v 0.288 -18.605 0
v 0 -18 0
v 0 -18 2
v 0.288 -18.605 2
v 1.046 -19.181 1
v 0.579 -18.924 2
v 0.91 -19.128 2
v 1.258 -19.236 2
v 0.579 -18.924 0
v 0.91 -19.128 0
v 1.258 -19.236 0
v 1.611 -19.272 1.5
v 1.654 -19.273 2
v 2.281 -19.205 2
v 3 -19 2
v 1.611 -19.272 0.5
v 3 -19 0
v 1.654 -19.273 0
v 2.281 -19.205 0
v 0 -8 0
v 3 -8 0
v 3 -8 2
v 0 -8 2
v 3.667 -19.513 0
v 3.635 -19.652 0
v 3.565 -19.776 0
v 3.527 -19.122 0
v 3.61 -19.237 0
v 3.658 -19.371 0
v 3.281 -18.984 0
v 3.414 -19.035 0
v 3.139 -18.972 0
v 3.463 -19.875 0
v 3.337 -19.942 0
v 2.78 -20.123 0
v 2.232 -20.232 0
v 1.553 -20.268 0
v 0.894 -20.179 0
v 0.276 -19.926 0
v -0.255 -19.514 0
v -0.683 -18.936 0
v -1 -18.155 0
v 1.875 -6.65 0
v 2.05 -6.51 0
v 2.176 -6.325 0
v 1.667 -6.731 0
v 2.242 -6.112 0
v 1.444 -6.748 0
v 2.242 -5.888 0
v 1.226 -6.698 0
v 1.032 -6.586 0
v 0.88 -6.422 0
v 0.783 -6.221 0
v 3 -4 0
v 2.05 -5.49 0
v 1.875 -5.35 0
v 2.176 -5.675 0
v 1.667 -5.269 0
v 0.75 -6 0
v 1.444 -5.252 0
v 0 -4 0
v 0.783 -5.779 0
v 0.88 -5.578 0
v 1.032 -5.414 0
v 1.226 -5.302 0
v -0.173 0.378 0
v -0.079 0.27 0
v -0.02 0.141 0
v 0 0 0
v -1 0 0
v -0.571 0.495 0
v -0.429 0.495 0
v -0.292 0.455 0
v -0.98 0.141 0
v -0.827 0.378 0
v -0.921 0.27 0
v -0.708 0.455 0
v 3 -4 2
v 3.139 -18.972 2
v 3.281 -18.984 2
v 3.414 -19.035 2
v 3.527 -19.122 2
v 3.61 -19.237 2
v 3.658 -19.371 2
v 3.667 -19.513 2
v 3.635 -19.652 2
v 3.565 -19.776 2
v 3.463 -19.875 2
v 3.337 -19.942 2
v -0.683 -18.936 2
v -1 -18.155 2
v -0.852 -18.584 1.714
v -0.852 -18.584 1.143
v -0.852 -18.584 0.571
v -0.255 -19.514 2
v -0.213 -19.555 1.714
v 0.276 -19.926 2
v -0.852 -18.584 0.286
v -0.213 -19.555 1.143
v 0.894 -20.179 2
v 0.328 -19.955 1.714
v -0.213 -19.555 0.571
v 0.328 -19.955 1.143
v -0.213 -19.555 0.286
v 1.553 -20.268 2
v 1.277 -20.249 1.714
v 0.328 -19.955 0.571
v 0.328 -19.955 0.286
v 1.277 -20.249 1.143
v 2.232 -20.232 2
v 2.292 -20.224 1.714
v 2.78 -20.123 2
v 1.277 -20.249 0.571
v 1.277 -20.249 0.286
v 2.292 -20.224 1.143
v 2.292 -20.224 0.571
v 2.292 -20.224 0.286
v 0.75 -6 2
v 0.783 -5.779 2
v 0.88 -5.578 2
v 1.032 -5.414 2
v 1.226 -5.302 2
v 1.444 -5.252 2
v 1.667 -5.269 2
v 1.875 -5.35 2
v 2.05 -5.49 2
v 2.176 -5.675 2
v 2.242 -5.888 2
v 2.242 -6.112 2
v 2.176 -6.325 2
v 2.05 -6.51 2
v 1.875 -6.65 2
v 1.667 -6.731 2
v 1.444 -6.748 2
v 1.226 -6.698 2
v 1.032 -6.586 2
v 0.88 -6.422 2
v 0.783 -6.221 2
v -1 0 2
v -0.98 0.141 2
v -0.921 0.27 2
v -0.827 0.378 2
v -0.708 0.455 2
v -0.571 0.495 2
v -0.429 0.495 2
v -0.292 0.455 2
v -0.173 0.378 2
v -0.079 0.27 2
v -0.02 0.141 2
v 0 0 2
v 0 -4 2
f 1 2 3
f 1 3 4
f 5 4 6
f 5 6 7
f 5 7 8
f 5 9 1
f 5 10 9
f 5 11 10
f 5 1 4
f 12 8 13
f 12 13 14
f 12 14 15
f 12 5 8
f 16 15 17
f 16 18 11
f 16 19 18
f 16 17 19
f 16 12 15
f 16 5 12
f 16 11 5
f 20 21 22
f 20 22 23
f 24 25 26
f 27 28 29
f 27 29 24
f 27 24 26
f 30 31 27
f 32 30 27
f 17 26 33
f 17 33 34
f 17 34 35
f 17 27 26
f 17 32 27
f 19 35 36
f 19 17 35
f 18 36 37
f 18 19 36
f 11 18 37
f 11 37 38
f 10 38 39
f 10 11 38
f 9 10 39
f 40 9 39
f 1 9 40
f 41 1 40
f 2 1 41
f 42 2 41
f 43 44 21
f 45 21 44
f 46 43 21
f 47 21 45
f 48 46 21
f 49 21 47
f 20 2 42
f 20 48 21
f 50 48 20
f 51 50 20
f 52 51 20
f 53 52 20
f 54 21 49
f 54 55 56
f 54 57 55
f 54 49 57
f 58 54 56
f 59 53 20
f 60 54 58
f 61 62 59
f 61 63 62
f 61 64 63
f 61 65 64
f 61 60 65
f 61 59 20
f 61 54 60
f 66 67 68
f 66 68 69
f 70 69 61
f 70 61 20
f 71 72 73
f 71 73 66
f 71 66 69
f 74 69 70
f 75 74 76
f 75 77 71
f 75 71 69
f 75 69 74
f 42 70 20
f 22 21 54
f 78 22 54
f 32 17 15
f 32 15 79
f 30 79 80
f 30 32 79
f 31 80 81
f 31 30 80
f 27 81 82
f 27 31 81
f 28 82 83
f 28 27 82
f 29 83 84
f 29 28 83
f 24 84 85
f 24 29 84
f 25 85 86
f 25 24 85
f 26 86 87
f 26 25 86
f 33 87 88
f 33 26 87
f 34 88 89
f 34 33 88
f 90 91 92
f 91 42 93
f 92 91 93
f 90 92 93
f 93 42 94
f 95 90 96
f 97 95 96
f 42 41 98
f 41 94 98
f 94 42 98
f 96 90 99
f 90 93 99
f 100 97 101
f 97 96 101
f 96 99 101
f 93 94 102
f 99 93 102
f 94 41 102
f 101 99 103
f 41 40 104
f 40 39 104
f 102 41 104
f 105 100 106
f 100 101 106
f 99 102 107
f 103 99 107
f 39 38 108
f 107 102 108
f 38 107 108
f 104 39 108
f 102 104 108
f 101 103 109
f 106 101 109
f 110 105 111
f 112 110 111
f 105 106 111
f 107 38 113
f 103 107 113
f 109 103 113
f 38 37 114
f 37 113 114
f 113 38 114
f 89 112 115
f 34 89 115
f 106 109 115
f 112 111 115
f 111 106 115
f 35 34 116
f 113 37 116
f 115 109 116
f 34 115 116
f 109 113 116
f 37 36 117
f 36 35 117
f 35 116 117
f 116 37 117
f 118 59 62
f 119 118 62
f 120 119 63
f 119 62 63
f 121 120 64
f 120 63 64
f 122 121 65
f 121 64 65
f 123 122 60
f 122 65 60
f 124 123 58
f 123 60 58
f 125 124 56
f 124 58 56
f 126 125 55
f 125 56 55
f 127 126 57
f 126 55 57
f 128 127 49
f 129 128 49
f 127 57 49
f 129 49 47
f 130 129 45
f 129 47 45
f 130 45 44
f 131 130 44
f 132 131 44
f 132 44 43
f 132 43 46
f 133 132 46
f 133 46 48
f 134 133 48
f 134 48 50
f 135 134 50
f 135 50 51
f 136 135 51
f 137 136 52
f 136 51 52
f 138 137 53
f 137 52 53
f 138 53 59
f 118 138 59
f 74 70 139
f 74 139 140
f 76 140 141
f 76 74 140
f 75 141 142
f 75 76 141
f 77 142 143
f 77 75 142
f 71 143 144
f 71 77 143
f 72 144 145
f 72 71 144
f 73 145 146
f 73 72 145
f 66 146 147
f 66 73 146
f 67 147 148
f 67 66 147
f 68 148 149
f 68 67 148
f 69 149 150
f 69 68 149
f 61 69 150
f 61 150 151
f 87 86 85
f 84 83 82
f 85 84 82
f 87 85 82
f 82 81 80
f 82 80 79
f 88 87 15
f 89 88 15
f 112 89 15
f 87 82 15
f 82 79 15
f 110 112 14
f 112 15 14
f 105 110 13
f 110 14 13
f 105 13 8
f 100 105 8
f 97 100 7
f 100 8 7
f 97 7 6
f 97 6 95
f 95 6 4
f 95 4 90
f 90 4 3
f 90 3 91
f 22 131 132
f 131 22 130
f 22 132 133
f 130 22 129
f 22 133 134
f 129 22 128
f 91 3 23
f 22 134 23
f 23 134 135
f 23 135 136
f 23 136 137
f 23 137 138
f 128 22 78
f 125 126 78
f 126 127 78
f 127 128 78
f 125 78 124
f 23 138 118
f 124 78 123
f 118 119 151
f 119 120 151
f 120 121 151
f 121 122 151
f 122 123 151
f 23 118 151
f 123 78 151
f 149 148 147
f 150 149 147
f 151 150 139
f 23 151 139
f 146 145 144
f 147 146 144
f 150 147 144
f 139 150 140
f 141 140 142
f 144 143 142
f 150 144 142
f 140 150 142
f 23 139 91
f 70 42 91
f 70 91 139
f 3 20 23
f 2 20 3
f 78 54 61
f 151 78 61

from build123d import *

# Parameters (mm, degrees)
SALIENTE_EXTRUIR1_DEPTH = 2
CROQUIS3_W              = 3
CROQUIS3_H              = 4
CROQUIS3_R              = 0.75
SALIENTE_EXTRUIR2_DEPTH = 2


with BuildPart() as part:
    # Croquis1 → Saliente-Extruir1 (new body)
    with BuildSketch(Plane.XY):
        with BuildLine():
            Line((0, 0), (0, -18))
            add(Edge.make_bspline(
                [(0, -18), (0.591537416, -19.861671452), (3, -19)],
                knots=[0, 0, 0, 1, 1, 1], degree=2))
            ThreePointArc((3, -19), (3.639206917, -19.302348338), (3.336858579, -19.941555255))
            add(Edge.make_bspline(
                [(-1, -18.155053134), (-0.975859651, -18.232741401), (-0.899448228, -18.466363972), (-0.756134802, -18.817826734), (-0.454907757, -19.317869663), (0.02797097, -19.792887209), (0.777302206, -20.197268894), (2.276173322, -20.352435091), (3.336858579, -19.941555255)],
                knots=[-0.039688193, -0.039688193, -0.039688193, 0.009047191, 0.057782575, 0.155253343, 0.285214367, 0.415175391, 0.610116928, 1, 1, 1], degree=2))
            Line((-1, -18.155053134), (-1, 0))
            ThreePointArc((-1, 0), (-0.5, 0.5), (0, 0))
        make_face()
    extrude(amount=SALIENTE_EXTRUIR1_DEPTH)

    # Croquis3 → Saliente-Extruir2 (add)
    with BuildSketch(Plane(origin=(0, 0, 0), x_dir=(-1, 0, 0), z_dir=(0, 0, -1))):
        with Locations((-1.5, -6)):
            Rectangle(CROQUIS3_W, CROQUIS3_H)
        with Locations((-1.5, -6)):
            Circle(CROQUIS3_R, mode=Mode.SUBTRACT)
    extrude(amount=-SALIENTE_EXTRUIR2_DEPTH)


solid = part.part
